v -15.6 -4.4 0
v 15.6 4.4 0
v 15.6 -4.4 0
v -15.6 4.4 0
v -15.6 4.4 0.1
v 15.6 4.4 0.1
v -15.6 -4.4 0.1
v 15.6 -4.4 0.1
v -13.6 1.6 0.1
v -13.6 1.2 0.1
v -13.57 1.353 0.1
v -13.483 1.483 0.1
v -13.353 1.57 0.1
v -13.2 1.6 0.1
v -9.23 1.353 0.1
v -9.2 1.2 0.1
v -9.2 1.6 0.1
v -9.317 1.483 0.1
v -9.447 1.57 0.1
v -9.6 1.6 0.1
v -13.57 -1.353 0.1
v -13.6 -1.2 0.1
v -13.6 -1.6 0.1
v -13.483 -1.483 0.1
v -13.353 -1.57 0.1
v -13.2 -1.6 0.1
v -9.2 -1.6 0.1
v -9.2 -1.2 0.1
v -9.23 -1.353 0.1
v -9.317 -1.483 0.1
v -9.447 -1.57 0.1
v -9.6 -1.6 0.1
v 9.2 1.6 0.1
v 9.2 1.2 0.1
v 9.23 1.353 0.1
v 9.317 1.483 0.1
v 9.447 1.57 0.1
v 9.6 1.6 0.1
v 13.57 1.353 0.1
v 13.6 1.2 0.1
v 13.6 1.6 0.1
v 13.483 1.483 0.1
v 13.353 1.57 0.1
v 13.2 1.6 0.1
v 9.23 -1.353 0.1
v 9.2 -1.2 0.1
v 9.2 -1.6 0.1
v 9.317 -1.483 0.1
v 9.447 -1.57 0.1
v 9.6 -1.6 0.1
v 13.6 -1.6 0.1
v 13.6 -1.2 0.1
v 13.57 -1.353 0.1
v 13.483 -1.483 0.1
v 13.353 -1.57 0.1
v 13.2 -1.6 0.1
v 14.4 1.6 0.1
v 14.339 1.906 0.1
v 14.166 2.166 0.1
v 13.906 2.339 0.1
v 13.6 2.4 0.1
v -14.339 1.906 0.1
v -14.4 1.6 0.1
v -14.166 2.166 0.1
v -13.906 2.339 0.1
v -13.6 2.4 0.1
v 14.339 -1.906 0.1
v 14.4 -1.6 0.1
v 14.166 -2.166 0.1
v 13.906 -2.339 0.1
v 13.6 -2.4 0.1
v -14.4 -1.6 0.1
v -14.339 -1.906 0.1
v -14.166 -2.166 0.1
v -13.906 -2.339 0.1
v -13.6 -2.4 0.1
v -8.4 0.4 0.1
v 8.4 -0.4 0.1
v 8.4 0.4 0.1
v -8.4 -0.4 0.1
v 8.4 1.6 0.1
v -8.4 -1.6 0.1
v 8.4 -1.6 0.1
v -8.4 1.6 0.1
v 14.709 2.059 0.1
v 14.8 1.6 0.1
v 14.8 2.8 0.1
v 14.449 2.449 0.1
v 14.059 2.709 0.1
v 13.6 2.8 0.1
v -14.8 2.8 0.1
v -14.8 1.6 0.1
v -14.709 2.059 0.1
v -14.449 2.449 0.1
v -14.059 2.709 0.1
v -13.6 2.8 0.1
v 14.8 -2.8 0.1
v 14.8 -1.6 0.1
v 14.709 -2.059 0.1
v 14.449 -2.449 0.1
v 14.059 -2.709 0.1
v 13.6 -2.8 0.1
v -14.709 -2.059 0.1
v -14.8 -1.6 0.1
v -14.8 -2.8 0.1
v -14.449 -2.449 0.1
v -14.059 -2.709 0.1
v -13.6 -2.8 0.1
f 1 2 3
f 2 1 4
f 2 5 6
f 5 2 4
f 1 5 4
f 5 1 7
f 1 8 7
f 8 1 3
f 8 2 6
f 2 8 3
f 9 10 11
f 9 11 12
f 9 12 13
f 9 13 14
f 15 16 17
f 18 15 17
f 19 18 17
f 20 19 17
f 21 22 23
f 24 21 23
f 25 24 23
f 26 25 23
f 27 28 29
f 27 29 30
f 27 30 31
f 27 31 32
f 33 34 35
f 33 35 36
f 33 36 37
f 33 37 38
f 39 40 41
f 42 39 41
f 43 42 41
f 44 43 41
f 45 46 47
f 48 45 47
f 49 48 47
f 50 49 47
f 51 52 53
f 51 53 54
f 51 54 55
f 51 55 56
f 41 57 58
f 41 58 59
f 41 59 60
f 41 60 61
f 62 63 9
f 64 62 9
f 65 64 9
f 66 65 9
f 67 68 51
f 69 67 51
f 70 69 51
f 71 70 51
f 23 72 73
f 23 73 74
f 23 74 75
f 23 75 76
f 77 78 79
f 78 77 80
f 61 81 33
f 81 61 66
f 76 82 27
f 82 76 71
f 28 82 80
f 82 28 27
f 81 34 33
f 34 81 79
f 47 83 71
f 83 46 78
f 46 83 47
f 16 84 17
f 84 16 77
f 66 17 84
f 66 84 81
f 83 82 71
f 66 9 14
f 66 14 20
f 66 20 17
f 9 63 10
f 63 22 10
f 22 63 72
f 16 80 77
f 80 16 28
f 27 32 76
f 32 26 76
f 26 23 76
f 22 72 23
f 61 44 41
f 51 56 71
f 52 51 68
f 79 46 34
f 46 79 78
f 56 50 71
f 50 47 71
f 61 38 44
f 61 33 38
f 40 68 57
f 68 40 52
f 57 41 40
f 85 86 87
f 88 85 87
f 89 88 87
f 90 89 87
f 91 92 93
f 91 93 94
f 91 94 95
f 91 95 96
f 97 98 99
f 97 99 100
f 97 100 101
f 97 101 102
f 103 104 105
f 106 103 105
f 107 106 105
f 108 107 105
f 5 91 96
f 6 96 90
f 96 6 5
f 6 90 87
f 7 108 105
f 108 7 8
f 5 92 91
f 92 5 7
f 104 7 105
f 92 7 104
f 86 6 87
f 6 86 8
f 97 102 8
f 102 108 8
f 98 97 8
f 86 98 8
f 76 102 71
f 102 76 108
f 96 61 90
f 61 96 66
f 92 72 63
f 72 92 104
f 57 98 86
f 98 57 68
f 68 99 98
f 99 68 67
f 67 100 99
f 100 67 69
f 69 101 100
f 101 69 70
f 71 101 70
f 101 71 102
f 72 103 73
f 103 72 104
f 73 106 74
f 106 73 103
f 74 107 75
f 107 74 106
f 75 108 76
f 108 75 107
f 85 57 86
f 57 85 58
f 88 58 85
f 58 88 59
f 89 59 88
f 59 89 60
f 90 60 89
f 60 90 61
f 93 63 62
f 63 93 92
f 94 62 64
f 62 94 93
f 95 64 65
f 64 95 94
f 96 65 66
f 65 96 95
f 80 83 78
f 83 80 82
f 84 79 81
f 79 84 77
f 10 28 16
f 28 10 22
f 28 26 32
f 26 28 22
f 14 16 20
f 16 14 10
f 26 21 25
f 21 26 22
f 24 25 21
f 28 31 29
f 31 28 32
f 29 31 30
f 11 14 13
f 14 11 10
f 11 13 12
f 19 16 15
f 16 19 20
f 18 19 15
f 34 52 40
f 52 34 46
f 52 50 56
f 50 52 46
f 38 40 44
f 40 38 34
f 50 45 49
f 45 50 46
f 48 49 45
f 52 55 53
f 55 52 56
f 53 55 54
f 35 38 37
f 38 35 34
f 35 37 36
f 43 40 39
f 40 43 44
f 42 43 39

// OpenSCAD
// file: ../p/1-4ring2.scad
use <../lib.scad>
function ldraw_lib__1_4ring2() = [
// 0 Ring  2 x 0.25
// 0 Name: 1-4ring2.dat
// 0 Author: Franklin W. Cain [fwcain]
// 0 !LDRAW_ORG Primitive UPDATE 2015-01
// 0 !LICENSE Licensed under CC BY 2.0 and CC BY 4.0 : see CAreadme.txt
// 
// 0 BFC CERTIFY CCW
  [0,"BFC","CERTIFY"],
  [0,"BFC","CCW"],
// 
// 0 !HISTORY 2001-12-31 [PTadmin] Official Update 2001-03
// 0 !HISTORY 2007-06-22 [PTadmin] Header formatted for Contributor Agreement
// 0 !HISTORY 2008-07-01 [PTadmin] Official Update 2008-01
// 0 !HISTORY 2012-02-16 [Philo] Changed to CCW
// 0 !HISTORY 2012-03-30 [PTadmin] Official Update 2012-01
// 0 !HISTORY 2014-12-25 [MMR1988] Fixed a rounding issue
// 0 !HISTORY 2015-10-11 [PTadmin] Official Update 2015-01
// 
// 
// 4 16 3 0 0 2.7717 0 1.1481 1.8478 0 0.7654 2 0 0
  [4,16,3,0,0,2.7717,0,1.1481,1.8478,0,0.7654,2,0,0],
// 4 16 2.7717 0 1.1481 2.1213 0 2.1213 1.4142 0 1.4142 1.8478 0 0.7654
  [4,16,2.7717,0,1.1481,2.1213,0,2.1213,1.4142,0,1.4142,1.8478,0,0.7654],
// 4 16 2.1213 0 2.1213 1.1481 0 2.7717 0.7654 0 1.8478 1.4142 0 1.4142
  [4,16,2.1213,0,2.1213,1.1481,0,2.7717,0.7654,0,1.8478,1.4142,0,1.4142],
// 4 16 1.1481 0 2.7717 0 0 3 0 0 2 0.7654 0 1.8478
  [4,16,1.1481,0,2.7717,0,0,3,0,0,2,0.7654,0,1.8478],
// 0 // Build by Primitive Generator 2
];
makepoly(ldraw_lib__1_4ring2(), line=0.2);
// file: ../p/1-4chrd.scad
use <../lib.scad>
function ldraw_lib__1_4chrd() = [
// 0 Chord 0.25
// 0 Name: 1-4chrd.dat
// 0 Author: Tony Hafner [hafhead]
// 0 !LDRAW_ORG Primitive UPDATE 2012-02
// 0 !LICENSE Licensed under CC BY 2.0 and CC BY 4.0 : see CAreadme.txt
// 
// 0 BFC CERTIFY CCW
  [0,"BFC","CERTIFY"],
  [0,"BFC","CCW"],
// 
// 0 !HISTORY 2004-04-22 [PTadmin] Official Update 2004-02
// 0 !HISTORY 2007-10-09 [PTadmin] Header formatted for Contributor Agreement
// 0 !HISTORY 2008-07-01 [PTadmin] Official Update 2008-01
// 0 !HISTORY 2012-08-02 [MMR1988] Re-creation with PrimGen2 and Rectifier
// 0 !HISTORY 2012-08-09 [PTadmin] Official Update 2012-02
// 
// 
// 4 16 0.9239 0 0.3827 0.3827 0 0.9239 0 0 1 1 0 0
  [4,16,0.9239,0,0.3827,0.3827,0,0.9239,0,0,1,1,0,0],
// 3 16 0.7071 0 0.7071 0.3827 0 0.9239 0.9239 0 0.3827
  [3,16,0.7071,0,0.7071,0.3827,0,0.9239,0.9239,0,0.3827],
];
makepoly(ldraw_lib__1_4chrd(), line=0.2);
// file: ../p/1-4ndis.scad
use <../lib.scad>
function ldraw_lib__1_4ndis() = [
// 0 Disc Negative 0.25
// 0 Name: 1-4ndis.dat
// 0 Author: James Jessiman
// 0 !LDRAW_ORG Primitive UPDATE 2012-01
// 0 !LICENSE Licensed under CC BY 2.0 and CC BY 4.0 : see CAreadme.txt
// 
// 0 BFC CERTIFY CCW
  [0,"BFC","CERTIFY"],
  [0,"BFC","CCW"],
// 
// 0 !HISTORY 2002-03-23 [sbliss] Added BFC Statement
// 0 !HISTORY 2002-04-25 [PTadmin] Official Update 2002-02
// 0 !HISTORY 2007-06-22 [PTadmin] Header formatted for Contributor Agreement
// 0 !HISTORY 2008-07-01 [PTadmin] Official Update 2008-01
// 0 !HISTORY 2012-02-16 [Philo] Changed to CCW
// 0 !HISTORY 2012-03-30 [PTadmin] Official Update 2012-01
// 
// 
// 3 16 0.9239 0 0.3827 1 0 0 1 0 1
  [3,16,0.9239,0,0.3827,1,0,0,1,0,1],
// 3 16 0.7071 0 0.7071 0.9239 0 0.3827 1 0 1
  [3,16,0.7071,0,0.7071,0.9239,0,0.3827,1,0,1],
// 3 16 0.3827 0 0.9239 0.7071 0 0.7071 1 0 1
  [3,16,0.3827,0,0.9239,0.7071,0,0.7071,1,0,1],
// 3 16 0 0 1 0.3827 0 0.9239 1 0 1
  [3,16,0,0,1,0.3827,0,0.9239,1,0,1],
];
makepoly(ldraw_lib__1_4ndis(), line=0.2);
// file: ../p/1-4disc.scad
use <../lib.scad>
function ldraw_lib__1_4disc() = [
// 0 Disc 0.25
// 0 Name: 1-4disc.dat
// 0 Author: James Jessiman
// 0 !LDRAW_ORG Primitive UPDATE 2002-02
// 0 !LICENSE Licensed under CC BY 2.0 and CC BY 4.0 : see CAreadme.txt
// 
// 0 BFC CERTIFY CCW
  [0,"BFC","CERTIFY"],
  [0,"BFC","CCW"],
// 
// 0 !HISTORY 2002-03-23 [sbliss] Added BFC statement.
// 0 !HISTORY 2002-04-25 [PTadmin] Official Update 2002-02
// 0 !HISTORY 2007-06-22 [PTadmin] Header formatted for Contributor Agreement
// 0 !HISTORY 2008-07-01 [PTadmin] Official Update 2008-01
// 
// 
// 3 16 0 0 0 1 0 0 0.9239 0 0.3827
  [3,16,0,0,0,1,0,0,0.9239,0,0.3827],
// 3 16 0 0 0 0.9239 0 0.3827 0.7071 0 0.7071
  [3,16,0,0,0,0.9239,0,0.3827,0.7071,0,0.7071],
// 3 16 0 0 0 0.7071 0 0.7071 0.3827 0 0.9239
  [3,16,0,0,0,0.7071,0,0.7071,0.3827,0,0.9239],
// 3 16 0 0 0 0.3827 0 0.9239 0 0 1
  [3,16,0,0,0,0.3827,0,0.9239,0,0,1],
// 0
];
makepoly(ldraw_lib__1_4disc(), line=0.2);
// file: s/3010a20.scad
use <../../lib.scad>
use <../../p/1-4chrd.scad>
use <../../p/1-4ring2.scad>
function ldraw_lib__s__3010a20() = [
// 0 ~Pattern Car Grille for Brick 1 x 4 - Colour
// 0 Name: s\3010a20.dat
// 0 Author: Chris Dee [cwdee]
// 0 !LDRAW_ORG Subpart UPDATE 2013-02
// 0 !LICENSE Licensed under CC BY 2.0 and CC BY 4.0 : see CAreadme.txt
// 
// 0 BFC CERTIFY CCW
  [0,"BFC","CERTIFY"],
  [0,"BFC","CCW"],
// 
// 0 !HISTORY 2002-02-18 [PTadmin] Official Update 2002-01
// 0 !HISTORY 2007-08-29 [PTadmin] Header formatted for Contributor Agreement
// 0 !HISTORY 2008-07-01 [PTadmin] Official Update 2008-01
// 0 !HISTORY 2008-07-07 [DeannaEarley] BFC'd (2005-11-06)
// 0 !HISTORY 2010-07-05 [PTadmin] Official Update 2010-02
// 0 !HISTORY 2013-03-29 [MagFors] Removed emphasis lines, t-junctions
// 0 !HISTORY 2013-04-04 [MMR1988] Saved 4 lines by using chrd instead of disc prims
// 0 !HISTORY 2013-12-23 [PTadmin] Official Update 2013-02
// 
// 
// 0 // Outer line
// 4 16 -34 6 -10 34 6 -10 34 5 -10 -34 5 -10
  [4,16,-34,6,-10,34,6,-10,34,5,-10,-34,5,-10],
// 4 16 -34 19 -10 34 19 -10 34 18 -10 -34 18 -10
  [4,16,-34,19,-10,34,19,-10,34,18,-10,-34,18,-10],
// 4 16 -37 16 -10 -36 16 -10 -36 8 -10 -37 8 -10
  [4,16,-37,16,-10,-36,16,-10,-36,8,-10,-37,8,-10],
// 4 16 37 8 -10 36 8 -10 36 16 -10 37 16 -10
  [4,16,37,8,-10,36,8,-10,36,16,-10,37,16,-10],
// 0 // Outer line corners
// 1 16 34 8 -10 1 0 0 0 0 -1 0 1 0 1-4ring2.dat
  [1,16,34,8,-10,1,0,0,0,0,-1,0,1,0, ldraw_lib__1_4ring2()],
// 1 16 -34 8 -10 -1 0 0 0 0 -1 0 1 0 1-4ring2.dat
  [1,16,-34,8,-10,-1,0,0,0,0,-1,0,1,0, ldraw_lib__1_4ring2()],
// 1 16 34 16 -10 1 0 0 0 0 1 0 1 0 1-4ring2.dat
  [1,16,34,16,-10,1,0,0,0,0,1,0,1,0, ldraw_lib__1_4ring2()],
// 1 16 -34 16 -10 -1 0 0 0 0 1 0 1 0 1-4ring2.dat
  [1,16,-34,16,-10,-1,0,0,0,0,1,0,1,0, ldraw_lib__1_4ring2()],
// 0 // Center grille
// 4 16 -21 11 -10 21 11 -10 21 8 -10 -21 8 -10
  [4,16,-21,11,-10,21,11,-10,21,8,-10,-21,8,-10],
// 4 16 -21 16 -10 21 16 -10 21 13 -10 -21 13 -10
  [4,16,-21,16,-10,21,16,-10,21,13,-10,-21,13,-10],
// 0 // Left light
// 4 16 -34 15 -10 -23 15 -10 -23 9 -10 -34 9 -10
  [4,16,-34,15,-10,-23,15,-10,-23,9,-10,-34,9,-10],
// 4 16 -34 9 -10 -23 9 -10 -24 8 -10 -33 8 -10
  [4,16,-34,9,-10,-23,9,-10,-24,8,-10,-33,8,-10],
// 4 16 -33 16 -10 -24 16 -10 -23 15 -10 -34 15 -10
  [4,16,-33,16,-10,-24,16,-10,-23,15,-10,-34,15,-10],
// 1 16 -33 9 -10 -1 0 0 0 0 -1 0 1 0 1-4chrd.dat
  [1,16,-33,9,-10,-1,0,0,0,0,-1,0,1,0, ldraw_lib__1_4chrd()],
// 1 16 -24 9 -10 1 0 0 0 0 -1 0 1 0 1-4chrd.dat
  [1,16,-24,9,-10,1,0,0,0,0,-1,0,1,0, ldraw_lib__1_4chrd()],
// 1 16 -33 15 -10 -1 0 0 0 0 1 0 1 0 1-4chrd.dat
  [1,16,-33,15,-10,-1,0,0,0,0,1,0,1,0, ldraw_lib__1_4chrd()],
// 1 16 -24 15 -10 1 0 0 0 0 1 0 1 0 1-4chrd.dat
  [1,16,-24,15,-10,1,0,0,0,0,1,0,1,0, ldraw_lib__1_4chrd()],
// 0 // Right light
// 4 16 34 9 -10 23 9 -10 23 15 -10 34 15 -10
  [4,16,34,9,-10,23,9,-10,23,15,-10,34,15,-10],
// 4 16 33 8 -10 24 8 -10 23 9 -10 34 9 -10
  [4,16,33,8,-10,24,8,-10,23,9,-10,34,9,-10],
// 4 16 34 15 -10 23 15 -10 24 16 -10 33 16 -10
  [4,16,34,15,-10,23,15,-10,24,16,-10,33,16,-10],
// 1 16 24 9 -10 -1 0 0 0 0 -1 0 1 0 1-4chrd.dat
  [1,16,24,9,-10,-1,0,0,0,0,-1,0,1,0, ldraw_lib__1_4chrd()],
// 1 16 33 9 -10 1 0 0 0 0 -1 0 1 0 1-4chrd.dat
  [1,16,33,9,-10,1,0,0,0,0,-1,0,1,0, ldraw_lib__1_4chrd()],
// 1 16 24 15 -10 -1 0 0 0 0 1 0 1 0 1-4chrd.dat
  [1,16,24,15,-10,-1,0,0,0,0,1,0,1,0, ldraw_lib__1_4chrd()],
// 1 16 33 15 -10 1 0 0 0 0 1 0 1 0 1-4chrd.dat
  [1,16,33,15,-10,1,0,0,0,0,1,0,1,0, ldraw_lib__1_4chrd()],
];
makepoly(ldraw_lib__s__3010a20(), line=0.2);
// file: s/004711bs02.scad
use <../../lib.scad>
use <../../p/1-4ndis.scad>
function ldraw_lib__s__004711bs02() = [
// 0 ~Pattern Car Grille for Sticker  1.1 x  3.9 - Background
// 0 Name: s\004711bs02.dat
// 0 Author: Takeshi Takahashi [RainbowDolphin]
// 0 !LDRAW_ORG Subpart UPDATE 2023-01
// 0 !LICENSE Licensed under CC BY 2.0 and CC BY 4.0 : see CAreadme.txt
// 
// 0 BFC CERTIFY CCW
  [0,"BFC","CERTIFY"],
  [0,"BFC","CCW"],
// 
// 0 !HISTORY 2023-03-05 [OrionP] Official Update 2023-01
// 
// 
// 0 // Line corners outside
// 1 16 34 -.25 4 3 0 0 0 1 0 0 0 3 1-4ndis.dat
  [1,16,34,-.25,4,3,0,0,0,1,0,0,0,3, ldraw_lib__1_4ndis()],
// 1 16 -34 -.25 4 -3 0 0 0 1 0 0 0 3 1-4ndis.dat
  [1,16,-34,-.25,4,-3,0,0,0,1,0,0,0,3, ldraw_lib__1_4ndis()],
// 1 16 34 -.25 -4 3 0 0 0 1 0 0 0 -3 1-4ndis.dat
  [1,16,34,-.25,-4,3,0,0,0,1,0,0,0,-3, ldraw_lib__1_4ndis()],
// 1 16 -34 -.25 -4 -3 0 0 0 1 0 0 0 -3 1-4ndis.dat
  [1,16,-34,-.25,-4,-3,0,0,0,1,0,0,0,-3, ldraw_lib__1_4ndis()],
// 0 // Outside
// 3 16 -39 -.25 11 -37 -.25 7 -34 -.25 7
  [3,16,-39,-.25,11,-37,-.25,7,-34,-.25,7],
// 4 16 -39 -.25 11 -34 -.25 7 34 -.25 7 39 -.25 11
  [4,16,-39,-.25,11,-34,-.25,7,34,-.25,7,39,-.25,11],
// 3 16 39 -.25 11 34 -.25 7 37 -.25 7
  [3,16,39,-.25,11,34,-.25,7,37,-.25,7],
// 4 16 -34 -.25 -7 -37 -.25 -7 -39 -.25 -11 39 -.25 -11
  [4,16,-34,-.25,-7,-37,-.25,-7,-39,-.25,-11,39,-.25,-11],
// 4 16 -37 -.25 4 -37 -.25 7 -39 -.25 11 -39 -.25 -11
  [4,16,-37,-.25,4,-37,-.25,7,-39,-.25,11,-39,-.25,-11],
// 3 16 -37 -.25 -4 -39 -.25 -11 -37 -.25 -7
  [3,16,-37,-.25,-4,-39,-.25,-11,-37,-.25,-7],
// 3 16 -37 -.25 4 -39 -.25 -11 -37 -.25 -4
  [3,16,-37,-.25,4,-39,-.25,-11,-37,-.25,-4],
// 4 16 39 -.25 11 37 -.25 7 37 -.25 4 39 -.25 -11
  [4,16,39,-.25,11,37,-.25,7,37,-.25,4,39,-.25,-11],
// 3 16 37 -.25 -7 34 -.25 -7 39 -.25 -11
  [3,16,37,-.25,-7,34,-.25,-7,39,-.25,-11],
// 3 16 34 -.25 -7 -34 -.25 -7 39 -.25 -11
  [3,16,34,-.25,-7,-34,-.25,-7,39,-.25,-11],
// 3 16 37 -.25 -4 37 -.25 -7 39 -.25 -11
  [3,16,37,-.25,-4,37,-.25,-7,39,-.25,-11],
// 3 16 37 -.25 4 37 -.25 -4 39 -.25 -11
  [3,16,37,-.25,4,37,-.25,-4,39,-.25,-11],
];
makepoly(ldraw_lib__s__004711bs02(), line=0.2);
// file: s/004711bs01.scad
use <../../lib.scad>
use <../../p/1-4disc.scad>
use <../../p/1-4ndis.scad>
function ldraw_lib__s__004711bs01() = [
// 0 ~Pattern Car Grille for Sticker  1.1 x  3.9 - Mask
// 0 Name: s\004711bs01.dat
// 0 Author: Takeshi Takahashi [RainbowDolphin]
// 0 !LDRAW_ORG Subpart UPDATE 2023-01
// 0 !LICENSE Licensed under CC BY 2.0 and CC BY 4.0 : see CAreadme.txt
// 
// 0 BFC CERTIFY CCW
  [0,"BFC","CERTIFY"],
  [0,"BFC","CCW"],
// 
// 0 !HISTORY 2020-11-08 [RainbowDolphin] Created based on s\3010b20 by Chris Dee [cwdee]
// 0 !HISTORY 2023-03-05 [OrionP] Official Update 2023-01
// 
// 
// 0 // Left light corners
// 
// 1 16 -33 -.25 3 -1 0 0 0 1 0 0 0 1 1-4ndis.dat
  [1,16,-33,-.25,3,-1,0,0,0,1,0,0,0,1, ldraw_lib__1_4ndis()],
// 1 16 -24 -.25 3 1 0 0 0 1 0 0 0 1 1-4ndis.dat
  [1,16,-24,-.25,3,1,0,0,0,1,0,0,0,1, ldraw_lib__1_4ndis()],
// 1 16 -33 -.25 -3 -1 0 0 0 1 0 0 0 -1 1-4ndis.dat
  [1,16,-33,-.25,-3,-1,0,0,0,1,0,0,0,-1, ldraw_lib__1_4ndis()],
// 1 16 -24 -.25 -3 1 0 0 0 1 0 0 0 -1 1-4ndis.dat
  [1,16,-24,-.25,-3,1,0,0,0,1,0,0,0,-1, ldraw_lib__1_4ndis()],
// 0 // Right light corners
// 1 16 24 -.25 3 -1 0 0 0 1 0 0 0 1 1-4ndis.dat
  [1,16,24,-.25,3,-1,0,0,0,1,0,0,0,1, ldraw_lib__1_4ndis()],
// 1 16 33 -.25 3 1 0 0 0 1 0 0 0 1 1-4ndis.dat
  [1,16,33,-.25,3,1,0,0,0,1,0,0,0,1, ldraw_lib__1_4ndis()],
// 1 16 24 -.25 -3 -1 0 0 0 1 0 0 0 -1 1-4ndis.dat
  [1,16,24,-.25,-3,-1,0,0,0,1,0,0,0,-1, ldraw_lib__1_4ndis()],
// 1 16 33 -.25 -3 1 0 0 0 1 0 0 0 -1 1-4ndis.dat
  [1,16,33,-.25,-3,1,0,0,0,1,0,0,0,-1, ldraw_lib__1_4ndis()],
// 0 // Line corners inside
// 1 16 34 -.25 4 2 0 0 0 1 0 0 0 2 1-4disc.dat
  [1,16,34,-.25,4,2,0,0,0,1,0,0,0,2, ldraw_lib__1_4disc()],
// 1 16 -34 -.25 4 -2 0 0 0 1 0 0 0 2 1-4disc.dat
  [1,16,-34,-.25,4,-2,0,0,0,1,0,0,0,2, ldraw_lib__1_4disc()],
// 1 16 34 -.25 -4 2 0 0 0 1 0 0 0 -2 1-4disc.dat
  [1,16,34,-.25,-4,2,0,0,0,1,0,0,0,-2, ldraw_lib__1_4disc()],
// 1 16 -34 -.25 -4 -2 0 0 0 1 0 0 0 -2 1-4disc.dat
  [1,16,-34,-.25,-4,-2,0,0,0,1,0,0,0,-2, ldraw_lib__1_4disc()],
// 0 // Inside
// 4 16 -21 -.25 -1 21 -.25 -1 21 -.25 1 -21 -.25 1
  [4,16,-21,-.25,-1,21,-.25,-1,21,-.25,1,-21,-.25,1],
// 4 16 21 -.25 4 23 -.25 4 34 -.25 6 -34 -.25 6
  [4,16,21,-.25,4,23,-.25,4,34,-.25,6,-34,-.25,6],
// 4 16 -21 -.25 -4 -23 -.25 -4 -34 -.25 -6 34 -.25 -6
  [4,16,-21,-.25,-4,-23,-.25,-4,-34,-.25,-6,34,-.25,-6],
// 4 16 -23 -.25 -4 -21 -.25 -4 -21 -.25 -1 -23 -.25 -3
  [4,16,-23,-.25,-4,-21,-.25,-4,-21,-.25,-1,-23,-.25,-3],
// 4 16 23 -.25 4 21 -.25 4 21 -.25 1 23 -.25 3
  [4,16,23,-.25,4,21,-.25,4,21,-.25,1,23,-.25,3],
// 3 16 23 -.25 -4 21 -.25 -4 34 -.25 -6
  [3,16,23,-.25,-4,21,-.25,-4,34,-.25,-6],
// 4 16 21 -.25 -1 21 -.25 -4 23 -.25 -4 23 -.25 -3
  [4,16,21,-.25,-1,21,-.25,-4,23,-.25,-4,23,-.25,-3],
// 4 16 -21 -.25 1 -21 -.25 4 -23 -.25 4 -23 -.25 3
  [4,16,-21,-.25,1,-21,-.25,4,-23,-.25,4,-23,-.25,3],
// 3 16 -34 -.25 6 -23 -.25 4 -21 -.25 4
  [3,16,-34,-.25,6,-23,-.25,4,-21,-.25,4],
// 3 16 -34 -.25 6 -21 -.25 4 21 -.25 4
  [3,16,-34,-.25,6,-21,-.25,4,21,-.25,4],
// 3 16 21 -.25 -4 -21 -.25 -4 34 -.25 -6
  [3,16,21,-.25,-4,-21,-.25,-4,34,-.25,-6],
// 3 16 -34 -.25 6 -34 -.25 4 -33 -.25 4
  [3,16,-34,-.25,6,-34,-.25,4,-33,-.25,4],
// 3 16 -34 -.25 6 -33 -.25 4 -24 -.25 4
  [3,16,-34,-.25,6,-33,-.25,4,-24,-.25,4],
// 3 16 -34 -.25 6 -24 -.25 4 -23 -.25 4
  [3,16,-34,-.25,6,-24,-.25,4,-23,-.25,4],
// 3 16 -34 -.25 4 -36 -.25 4 -34 -.25 3
  [3,16,-34,-.25,4,-36,-.25,4,-34,-.25,3],
// 4 16 -34 -.25 -3 -34 -.25 3 -36 -.25 4 -36 -.25 -4
  [4,16,-34,-.25,-3,-34,-.25,3,-36,-.25,4,-36,-.25,-4],
// 4 16 -23 -.25 3 -23 -.25 -3 -21 -.25 -1 -21 -.25 1
  [4,16,-23,-.25,3,-23,-.25,-3,-21,-.25,-1,-21,-.25,1],
// 3 16 -23 -.25 -4 -24 -.25 -4 -34 -.25 -6
  [3,16,-23,-.25,-4,-24,-.25,-4,-34,-.25,-6],
// 3 16 -24 -.25 -4 -33 -.25 -4 -34 -.25 -6
  [3,16,-24,-.25,-4,-33,-.25,-4,-34,-.25,-6],
// 3 16 -33 -.25 -4 -34 -.25 -4 -34 -.25 -6
  [3,16,-33,-.25,-4,-34,-.25,-4,-34,-.25,-6],
// 3 16 -34 -.25 -3 -36 -.25 -4 -34 -.25 -4
  [3,16,-34,-.25,-3,-36,-.25,-4,-34,-.25,-4],
// 3 16 34 -.25 6 33 -.25 4 34 -.25 4
  [3,16,34,-.25,6,33,-.25,4,34,-.25,4],
// 3 16 34 -.25 -4 33 -.25 -4 34 -.25 -6
  [3,16,34,-.25,-4,33,-.25,-4,34,-.25,-6],
// 3 16 34 -.25 -3 34 -.25 -4 36 -.25 -4
  [3,16,34,-.25,-3,34,-.25,-4,36,-.25,-4],
// 4 16 23 -.25 -3 23 -.25 3 21 -.25 1 21 -.25 -1
  [4,16,23,-.25,-3,23,-.25,3,21,-.25,1,21,-.25,-1],
// 3 16 33 -.25 -4 24 -.25 -4 34 -.25 -6
  [3,16,33,-.25,-4,24,-.25,-4,34,-.25,-6],
// 3 16 24 -.25 -4 23 -.25 -4 34 -.25 -6
  [3,16,24,-.25,-4,23,-.25,-4,34,-.25,-6],
// 3 16 34 -.25 6 24 -.25 4 33 -.25 4
  [3,16,34,-.25,6,24,-.25,4,33,-.25,4],
// 3 16 34 -.25 6 23 -.25 4 24 -.25 4
  [3,16,34,-.25,6,23,-.25,4,24,-.25,4],
// 4 16 34 -.25 3 34 -.25 -3 36 -.25 -4 36 -.25 4
  [4,16,34,-.25,3,34,-.25,-3,36,-.25,-4,36,-.25,4],
// 3 16 36 -.25 4 34 -.25 4 34 -.25 3
  [3,16,36,-.25,4,34,-.25,4,34,-.25,3],
];
makepoly(ldraw_lib__s__004711bs01(), line=0.2);
// file: ../p/box5-12.scad
use <../lib.scad>
function ldraw_lib__box5_12() = [
// 0 Box with 5 Faces without Any Edges
// 0 Name: box5-12.dat
// 0 Author: Chris Dee [cwdee]
// 0 !LDRAW_ORG Primitive UPDATE 2009-02
// 0 !LICENSE Licensed under CC BY 2.0 and CC BY 4.0 : see CAreadme.txt
// 
// 0 BFC CERTIFY CCW
  [0,"BFC","CERTIFY"],
  [0,"BFC","CCW"],
// 
// 0 !HISTORY 2009-09-03 [PTadmin] Official Update 2009-02
// 
// 
// 4 16 1 1 1 1 1 -1 -1 1 -1 -1 1 1
  [4,16,1,1,1,1,1,-1,-1,1,-1,-1,1,1],
// 4 16 -1 0 1 1 0 1 1 1 1 -1 1 1
  [4,16,-1,0,1,1,0,1,1,1,1,-1,1,1],
// 4 16 -1 0 -1 -1 0 1 -1 1 1 -1 1 -1
  [4,16,-1,0,-1,-1,0,1,-1,1,1,-1,1,-1],
// 4 16 1 0 -1 -1 0 -1 -1 1 -1 1 1 -1
  [4,16,1,0,-1,-1,0,-1,-1,1,-1,1,1,-1],
// 4 16 1 0 1 1 0 -1 1 1 -1 1 1 1
  [4,16,1,0,1,1,0,-1,1,1,-1,1,1,1],
// 0
];
makepoly(ldraw_lib__box5_12(), line=0.2);
// main file
use <../lib.scad>
use <../p/box5-12.scad>
use <s/004711bs01.scad>
use <s/004711bs02.scad>
use <s/3010a20.scad>
function ldraw_lib__004762a() = [
// 0 Sticker  1.1 x  3.9 with Black Town Car Grille on Red Background
// 0 Name: 004762a.dat
// 0 Author: Takeshi Takahashi [RainbowDolphin]
// 0 !LDRAW_ORG Part UPDATE 2023-01
// 0 !LICENSE Licensed under CC BY 2.0 and CC BY 4.0 : see CAreadme.txt
// 
// 0 BFC CERTIFY CCW
  [0,"BFC","CERTIFY"],
  [0,"BFC","CCW"],
// 
// 0 !KEYWORDS Medic Car, Set 623-1
// 
// 0 !HISTORY 2023-03-05 [OrionP] Official Update 2023-01
// 
// 
// 1 16 0 -0.25 0 39 0 0 0 0.25 0 0 0 11 box5-12.dat
  [1,16,0,-0.25,0,39,0,0,0,0.25,0,0,0,11, ldraw_lib__box5_12()],
// 1 15 0 0 0 1 0 0 0 1 0 0 0 1 s\004711bs01.dat
  [1,15,0,0,0,1,0,0,0,1,0,0,0,1, ldraw_lib__s__004711bs01()],
// 1 4 0 0 0 1 0 0 0 1 0 0 0 1 s\004711bs02.dat
  [1,4,0,0,0,1,0,0,0,1,0,0,0,1, ldraw_lib__s__004711bs02()],
// 1 0 0 9.75 -12 1 0 0 0 0 1 0 1 0 s\3010a20.dat
  [1,0,0,9.75,-12,1,0,0,0,0,1,0,1,0, ldraw_lib__s__3010a20()],
];
makepoly(ldraw_lib__004762a(), line=0.2);
